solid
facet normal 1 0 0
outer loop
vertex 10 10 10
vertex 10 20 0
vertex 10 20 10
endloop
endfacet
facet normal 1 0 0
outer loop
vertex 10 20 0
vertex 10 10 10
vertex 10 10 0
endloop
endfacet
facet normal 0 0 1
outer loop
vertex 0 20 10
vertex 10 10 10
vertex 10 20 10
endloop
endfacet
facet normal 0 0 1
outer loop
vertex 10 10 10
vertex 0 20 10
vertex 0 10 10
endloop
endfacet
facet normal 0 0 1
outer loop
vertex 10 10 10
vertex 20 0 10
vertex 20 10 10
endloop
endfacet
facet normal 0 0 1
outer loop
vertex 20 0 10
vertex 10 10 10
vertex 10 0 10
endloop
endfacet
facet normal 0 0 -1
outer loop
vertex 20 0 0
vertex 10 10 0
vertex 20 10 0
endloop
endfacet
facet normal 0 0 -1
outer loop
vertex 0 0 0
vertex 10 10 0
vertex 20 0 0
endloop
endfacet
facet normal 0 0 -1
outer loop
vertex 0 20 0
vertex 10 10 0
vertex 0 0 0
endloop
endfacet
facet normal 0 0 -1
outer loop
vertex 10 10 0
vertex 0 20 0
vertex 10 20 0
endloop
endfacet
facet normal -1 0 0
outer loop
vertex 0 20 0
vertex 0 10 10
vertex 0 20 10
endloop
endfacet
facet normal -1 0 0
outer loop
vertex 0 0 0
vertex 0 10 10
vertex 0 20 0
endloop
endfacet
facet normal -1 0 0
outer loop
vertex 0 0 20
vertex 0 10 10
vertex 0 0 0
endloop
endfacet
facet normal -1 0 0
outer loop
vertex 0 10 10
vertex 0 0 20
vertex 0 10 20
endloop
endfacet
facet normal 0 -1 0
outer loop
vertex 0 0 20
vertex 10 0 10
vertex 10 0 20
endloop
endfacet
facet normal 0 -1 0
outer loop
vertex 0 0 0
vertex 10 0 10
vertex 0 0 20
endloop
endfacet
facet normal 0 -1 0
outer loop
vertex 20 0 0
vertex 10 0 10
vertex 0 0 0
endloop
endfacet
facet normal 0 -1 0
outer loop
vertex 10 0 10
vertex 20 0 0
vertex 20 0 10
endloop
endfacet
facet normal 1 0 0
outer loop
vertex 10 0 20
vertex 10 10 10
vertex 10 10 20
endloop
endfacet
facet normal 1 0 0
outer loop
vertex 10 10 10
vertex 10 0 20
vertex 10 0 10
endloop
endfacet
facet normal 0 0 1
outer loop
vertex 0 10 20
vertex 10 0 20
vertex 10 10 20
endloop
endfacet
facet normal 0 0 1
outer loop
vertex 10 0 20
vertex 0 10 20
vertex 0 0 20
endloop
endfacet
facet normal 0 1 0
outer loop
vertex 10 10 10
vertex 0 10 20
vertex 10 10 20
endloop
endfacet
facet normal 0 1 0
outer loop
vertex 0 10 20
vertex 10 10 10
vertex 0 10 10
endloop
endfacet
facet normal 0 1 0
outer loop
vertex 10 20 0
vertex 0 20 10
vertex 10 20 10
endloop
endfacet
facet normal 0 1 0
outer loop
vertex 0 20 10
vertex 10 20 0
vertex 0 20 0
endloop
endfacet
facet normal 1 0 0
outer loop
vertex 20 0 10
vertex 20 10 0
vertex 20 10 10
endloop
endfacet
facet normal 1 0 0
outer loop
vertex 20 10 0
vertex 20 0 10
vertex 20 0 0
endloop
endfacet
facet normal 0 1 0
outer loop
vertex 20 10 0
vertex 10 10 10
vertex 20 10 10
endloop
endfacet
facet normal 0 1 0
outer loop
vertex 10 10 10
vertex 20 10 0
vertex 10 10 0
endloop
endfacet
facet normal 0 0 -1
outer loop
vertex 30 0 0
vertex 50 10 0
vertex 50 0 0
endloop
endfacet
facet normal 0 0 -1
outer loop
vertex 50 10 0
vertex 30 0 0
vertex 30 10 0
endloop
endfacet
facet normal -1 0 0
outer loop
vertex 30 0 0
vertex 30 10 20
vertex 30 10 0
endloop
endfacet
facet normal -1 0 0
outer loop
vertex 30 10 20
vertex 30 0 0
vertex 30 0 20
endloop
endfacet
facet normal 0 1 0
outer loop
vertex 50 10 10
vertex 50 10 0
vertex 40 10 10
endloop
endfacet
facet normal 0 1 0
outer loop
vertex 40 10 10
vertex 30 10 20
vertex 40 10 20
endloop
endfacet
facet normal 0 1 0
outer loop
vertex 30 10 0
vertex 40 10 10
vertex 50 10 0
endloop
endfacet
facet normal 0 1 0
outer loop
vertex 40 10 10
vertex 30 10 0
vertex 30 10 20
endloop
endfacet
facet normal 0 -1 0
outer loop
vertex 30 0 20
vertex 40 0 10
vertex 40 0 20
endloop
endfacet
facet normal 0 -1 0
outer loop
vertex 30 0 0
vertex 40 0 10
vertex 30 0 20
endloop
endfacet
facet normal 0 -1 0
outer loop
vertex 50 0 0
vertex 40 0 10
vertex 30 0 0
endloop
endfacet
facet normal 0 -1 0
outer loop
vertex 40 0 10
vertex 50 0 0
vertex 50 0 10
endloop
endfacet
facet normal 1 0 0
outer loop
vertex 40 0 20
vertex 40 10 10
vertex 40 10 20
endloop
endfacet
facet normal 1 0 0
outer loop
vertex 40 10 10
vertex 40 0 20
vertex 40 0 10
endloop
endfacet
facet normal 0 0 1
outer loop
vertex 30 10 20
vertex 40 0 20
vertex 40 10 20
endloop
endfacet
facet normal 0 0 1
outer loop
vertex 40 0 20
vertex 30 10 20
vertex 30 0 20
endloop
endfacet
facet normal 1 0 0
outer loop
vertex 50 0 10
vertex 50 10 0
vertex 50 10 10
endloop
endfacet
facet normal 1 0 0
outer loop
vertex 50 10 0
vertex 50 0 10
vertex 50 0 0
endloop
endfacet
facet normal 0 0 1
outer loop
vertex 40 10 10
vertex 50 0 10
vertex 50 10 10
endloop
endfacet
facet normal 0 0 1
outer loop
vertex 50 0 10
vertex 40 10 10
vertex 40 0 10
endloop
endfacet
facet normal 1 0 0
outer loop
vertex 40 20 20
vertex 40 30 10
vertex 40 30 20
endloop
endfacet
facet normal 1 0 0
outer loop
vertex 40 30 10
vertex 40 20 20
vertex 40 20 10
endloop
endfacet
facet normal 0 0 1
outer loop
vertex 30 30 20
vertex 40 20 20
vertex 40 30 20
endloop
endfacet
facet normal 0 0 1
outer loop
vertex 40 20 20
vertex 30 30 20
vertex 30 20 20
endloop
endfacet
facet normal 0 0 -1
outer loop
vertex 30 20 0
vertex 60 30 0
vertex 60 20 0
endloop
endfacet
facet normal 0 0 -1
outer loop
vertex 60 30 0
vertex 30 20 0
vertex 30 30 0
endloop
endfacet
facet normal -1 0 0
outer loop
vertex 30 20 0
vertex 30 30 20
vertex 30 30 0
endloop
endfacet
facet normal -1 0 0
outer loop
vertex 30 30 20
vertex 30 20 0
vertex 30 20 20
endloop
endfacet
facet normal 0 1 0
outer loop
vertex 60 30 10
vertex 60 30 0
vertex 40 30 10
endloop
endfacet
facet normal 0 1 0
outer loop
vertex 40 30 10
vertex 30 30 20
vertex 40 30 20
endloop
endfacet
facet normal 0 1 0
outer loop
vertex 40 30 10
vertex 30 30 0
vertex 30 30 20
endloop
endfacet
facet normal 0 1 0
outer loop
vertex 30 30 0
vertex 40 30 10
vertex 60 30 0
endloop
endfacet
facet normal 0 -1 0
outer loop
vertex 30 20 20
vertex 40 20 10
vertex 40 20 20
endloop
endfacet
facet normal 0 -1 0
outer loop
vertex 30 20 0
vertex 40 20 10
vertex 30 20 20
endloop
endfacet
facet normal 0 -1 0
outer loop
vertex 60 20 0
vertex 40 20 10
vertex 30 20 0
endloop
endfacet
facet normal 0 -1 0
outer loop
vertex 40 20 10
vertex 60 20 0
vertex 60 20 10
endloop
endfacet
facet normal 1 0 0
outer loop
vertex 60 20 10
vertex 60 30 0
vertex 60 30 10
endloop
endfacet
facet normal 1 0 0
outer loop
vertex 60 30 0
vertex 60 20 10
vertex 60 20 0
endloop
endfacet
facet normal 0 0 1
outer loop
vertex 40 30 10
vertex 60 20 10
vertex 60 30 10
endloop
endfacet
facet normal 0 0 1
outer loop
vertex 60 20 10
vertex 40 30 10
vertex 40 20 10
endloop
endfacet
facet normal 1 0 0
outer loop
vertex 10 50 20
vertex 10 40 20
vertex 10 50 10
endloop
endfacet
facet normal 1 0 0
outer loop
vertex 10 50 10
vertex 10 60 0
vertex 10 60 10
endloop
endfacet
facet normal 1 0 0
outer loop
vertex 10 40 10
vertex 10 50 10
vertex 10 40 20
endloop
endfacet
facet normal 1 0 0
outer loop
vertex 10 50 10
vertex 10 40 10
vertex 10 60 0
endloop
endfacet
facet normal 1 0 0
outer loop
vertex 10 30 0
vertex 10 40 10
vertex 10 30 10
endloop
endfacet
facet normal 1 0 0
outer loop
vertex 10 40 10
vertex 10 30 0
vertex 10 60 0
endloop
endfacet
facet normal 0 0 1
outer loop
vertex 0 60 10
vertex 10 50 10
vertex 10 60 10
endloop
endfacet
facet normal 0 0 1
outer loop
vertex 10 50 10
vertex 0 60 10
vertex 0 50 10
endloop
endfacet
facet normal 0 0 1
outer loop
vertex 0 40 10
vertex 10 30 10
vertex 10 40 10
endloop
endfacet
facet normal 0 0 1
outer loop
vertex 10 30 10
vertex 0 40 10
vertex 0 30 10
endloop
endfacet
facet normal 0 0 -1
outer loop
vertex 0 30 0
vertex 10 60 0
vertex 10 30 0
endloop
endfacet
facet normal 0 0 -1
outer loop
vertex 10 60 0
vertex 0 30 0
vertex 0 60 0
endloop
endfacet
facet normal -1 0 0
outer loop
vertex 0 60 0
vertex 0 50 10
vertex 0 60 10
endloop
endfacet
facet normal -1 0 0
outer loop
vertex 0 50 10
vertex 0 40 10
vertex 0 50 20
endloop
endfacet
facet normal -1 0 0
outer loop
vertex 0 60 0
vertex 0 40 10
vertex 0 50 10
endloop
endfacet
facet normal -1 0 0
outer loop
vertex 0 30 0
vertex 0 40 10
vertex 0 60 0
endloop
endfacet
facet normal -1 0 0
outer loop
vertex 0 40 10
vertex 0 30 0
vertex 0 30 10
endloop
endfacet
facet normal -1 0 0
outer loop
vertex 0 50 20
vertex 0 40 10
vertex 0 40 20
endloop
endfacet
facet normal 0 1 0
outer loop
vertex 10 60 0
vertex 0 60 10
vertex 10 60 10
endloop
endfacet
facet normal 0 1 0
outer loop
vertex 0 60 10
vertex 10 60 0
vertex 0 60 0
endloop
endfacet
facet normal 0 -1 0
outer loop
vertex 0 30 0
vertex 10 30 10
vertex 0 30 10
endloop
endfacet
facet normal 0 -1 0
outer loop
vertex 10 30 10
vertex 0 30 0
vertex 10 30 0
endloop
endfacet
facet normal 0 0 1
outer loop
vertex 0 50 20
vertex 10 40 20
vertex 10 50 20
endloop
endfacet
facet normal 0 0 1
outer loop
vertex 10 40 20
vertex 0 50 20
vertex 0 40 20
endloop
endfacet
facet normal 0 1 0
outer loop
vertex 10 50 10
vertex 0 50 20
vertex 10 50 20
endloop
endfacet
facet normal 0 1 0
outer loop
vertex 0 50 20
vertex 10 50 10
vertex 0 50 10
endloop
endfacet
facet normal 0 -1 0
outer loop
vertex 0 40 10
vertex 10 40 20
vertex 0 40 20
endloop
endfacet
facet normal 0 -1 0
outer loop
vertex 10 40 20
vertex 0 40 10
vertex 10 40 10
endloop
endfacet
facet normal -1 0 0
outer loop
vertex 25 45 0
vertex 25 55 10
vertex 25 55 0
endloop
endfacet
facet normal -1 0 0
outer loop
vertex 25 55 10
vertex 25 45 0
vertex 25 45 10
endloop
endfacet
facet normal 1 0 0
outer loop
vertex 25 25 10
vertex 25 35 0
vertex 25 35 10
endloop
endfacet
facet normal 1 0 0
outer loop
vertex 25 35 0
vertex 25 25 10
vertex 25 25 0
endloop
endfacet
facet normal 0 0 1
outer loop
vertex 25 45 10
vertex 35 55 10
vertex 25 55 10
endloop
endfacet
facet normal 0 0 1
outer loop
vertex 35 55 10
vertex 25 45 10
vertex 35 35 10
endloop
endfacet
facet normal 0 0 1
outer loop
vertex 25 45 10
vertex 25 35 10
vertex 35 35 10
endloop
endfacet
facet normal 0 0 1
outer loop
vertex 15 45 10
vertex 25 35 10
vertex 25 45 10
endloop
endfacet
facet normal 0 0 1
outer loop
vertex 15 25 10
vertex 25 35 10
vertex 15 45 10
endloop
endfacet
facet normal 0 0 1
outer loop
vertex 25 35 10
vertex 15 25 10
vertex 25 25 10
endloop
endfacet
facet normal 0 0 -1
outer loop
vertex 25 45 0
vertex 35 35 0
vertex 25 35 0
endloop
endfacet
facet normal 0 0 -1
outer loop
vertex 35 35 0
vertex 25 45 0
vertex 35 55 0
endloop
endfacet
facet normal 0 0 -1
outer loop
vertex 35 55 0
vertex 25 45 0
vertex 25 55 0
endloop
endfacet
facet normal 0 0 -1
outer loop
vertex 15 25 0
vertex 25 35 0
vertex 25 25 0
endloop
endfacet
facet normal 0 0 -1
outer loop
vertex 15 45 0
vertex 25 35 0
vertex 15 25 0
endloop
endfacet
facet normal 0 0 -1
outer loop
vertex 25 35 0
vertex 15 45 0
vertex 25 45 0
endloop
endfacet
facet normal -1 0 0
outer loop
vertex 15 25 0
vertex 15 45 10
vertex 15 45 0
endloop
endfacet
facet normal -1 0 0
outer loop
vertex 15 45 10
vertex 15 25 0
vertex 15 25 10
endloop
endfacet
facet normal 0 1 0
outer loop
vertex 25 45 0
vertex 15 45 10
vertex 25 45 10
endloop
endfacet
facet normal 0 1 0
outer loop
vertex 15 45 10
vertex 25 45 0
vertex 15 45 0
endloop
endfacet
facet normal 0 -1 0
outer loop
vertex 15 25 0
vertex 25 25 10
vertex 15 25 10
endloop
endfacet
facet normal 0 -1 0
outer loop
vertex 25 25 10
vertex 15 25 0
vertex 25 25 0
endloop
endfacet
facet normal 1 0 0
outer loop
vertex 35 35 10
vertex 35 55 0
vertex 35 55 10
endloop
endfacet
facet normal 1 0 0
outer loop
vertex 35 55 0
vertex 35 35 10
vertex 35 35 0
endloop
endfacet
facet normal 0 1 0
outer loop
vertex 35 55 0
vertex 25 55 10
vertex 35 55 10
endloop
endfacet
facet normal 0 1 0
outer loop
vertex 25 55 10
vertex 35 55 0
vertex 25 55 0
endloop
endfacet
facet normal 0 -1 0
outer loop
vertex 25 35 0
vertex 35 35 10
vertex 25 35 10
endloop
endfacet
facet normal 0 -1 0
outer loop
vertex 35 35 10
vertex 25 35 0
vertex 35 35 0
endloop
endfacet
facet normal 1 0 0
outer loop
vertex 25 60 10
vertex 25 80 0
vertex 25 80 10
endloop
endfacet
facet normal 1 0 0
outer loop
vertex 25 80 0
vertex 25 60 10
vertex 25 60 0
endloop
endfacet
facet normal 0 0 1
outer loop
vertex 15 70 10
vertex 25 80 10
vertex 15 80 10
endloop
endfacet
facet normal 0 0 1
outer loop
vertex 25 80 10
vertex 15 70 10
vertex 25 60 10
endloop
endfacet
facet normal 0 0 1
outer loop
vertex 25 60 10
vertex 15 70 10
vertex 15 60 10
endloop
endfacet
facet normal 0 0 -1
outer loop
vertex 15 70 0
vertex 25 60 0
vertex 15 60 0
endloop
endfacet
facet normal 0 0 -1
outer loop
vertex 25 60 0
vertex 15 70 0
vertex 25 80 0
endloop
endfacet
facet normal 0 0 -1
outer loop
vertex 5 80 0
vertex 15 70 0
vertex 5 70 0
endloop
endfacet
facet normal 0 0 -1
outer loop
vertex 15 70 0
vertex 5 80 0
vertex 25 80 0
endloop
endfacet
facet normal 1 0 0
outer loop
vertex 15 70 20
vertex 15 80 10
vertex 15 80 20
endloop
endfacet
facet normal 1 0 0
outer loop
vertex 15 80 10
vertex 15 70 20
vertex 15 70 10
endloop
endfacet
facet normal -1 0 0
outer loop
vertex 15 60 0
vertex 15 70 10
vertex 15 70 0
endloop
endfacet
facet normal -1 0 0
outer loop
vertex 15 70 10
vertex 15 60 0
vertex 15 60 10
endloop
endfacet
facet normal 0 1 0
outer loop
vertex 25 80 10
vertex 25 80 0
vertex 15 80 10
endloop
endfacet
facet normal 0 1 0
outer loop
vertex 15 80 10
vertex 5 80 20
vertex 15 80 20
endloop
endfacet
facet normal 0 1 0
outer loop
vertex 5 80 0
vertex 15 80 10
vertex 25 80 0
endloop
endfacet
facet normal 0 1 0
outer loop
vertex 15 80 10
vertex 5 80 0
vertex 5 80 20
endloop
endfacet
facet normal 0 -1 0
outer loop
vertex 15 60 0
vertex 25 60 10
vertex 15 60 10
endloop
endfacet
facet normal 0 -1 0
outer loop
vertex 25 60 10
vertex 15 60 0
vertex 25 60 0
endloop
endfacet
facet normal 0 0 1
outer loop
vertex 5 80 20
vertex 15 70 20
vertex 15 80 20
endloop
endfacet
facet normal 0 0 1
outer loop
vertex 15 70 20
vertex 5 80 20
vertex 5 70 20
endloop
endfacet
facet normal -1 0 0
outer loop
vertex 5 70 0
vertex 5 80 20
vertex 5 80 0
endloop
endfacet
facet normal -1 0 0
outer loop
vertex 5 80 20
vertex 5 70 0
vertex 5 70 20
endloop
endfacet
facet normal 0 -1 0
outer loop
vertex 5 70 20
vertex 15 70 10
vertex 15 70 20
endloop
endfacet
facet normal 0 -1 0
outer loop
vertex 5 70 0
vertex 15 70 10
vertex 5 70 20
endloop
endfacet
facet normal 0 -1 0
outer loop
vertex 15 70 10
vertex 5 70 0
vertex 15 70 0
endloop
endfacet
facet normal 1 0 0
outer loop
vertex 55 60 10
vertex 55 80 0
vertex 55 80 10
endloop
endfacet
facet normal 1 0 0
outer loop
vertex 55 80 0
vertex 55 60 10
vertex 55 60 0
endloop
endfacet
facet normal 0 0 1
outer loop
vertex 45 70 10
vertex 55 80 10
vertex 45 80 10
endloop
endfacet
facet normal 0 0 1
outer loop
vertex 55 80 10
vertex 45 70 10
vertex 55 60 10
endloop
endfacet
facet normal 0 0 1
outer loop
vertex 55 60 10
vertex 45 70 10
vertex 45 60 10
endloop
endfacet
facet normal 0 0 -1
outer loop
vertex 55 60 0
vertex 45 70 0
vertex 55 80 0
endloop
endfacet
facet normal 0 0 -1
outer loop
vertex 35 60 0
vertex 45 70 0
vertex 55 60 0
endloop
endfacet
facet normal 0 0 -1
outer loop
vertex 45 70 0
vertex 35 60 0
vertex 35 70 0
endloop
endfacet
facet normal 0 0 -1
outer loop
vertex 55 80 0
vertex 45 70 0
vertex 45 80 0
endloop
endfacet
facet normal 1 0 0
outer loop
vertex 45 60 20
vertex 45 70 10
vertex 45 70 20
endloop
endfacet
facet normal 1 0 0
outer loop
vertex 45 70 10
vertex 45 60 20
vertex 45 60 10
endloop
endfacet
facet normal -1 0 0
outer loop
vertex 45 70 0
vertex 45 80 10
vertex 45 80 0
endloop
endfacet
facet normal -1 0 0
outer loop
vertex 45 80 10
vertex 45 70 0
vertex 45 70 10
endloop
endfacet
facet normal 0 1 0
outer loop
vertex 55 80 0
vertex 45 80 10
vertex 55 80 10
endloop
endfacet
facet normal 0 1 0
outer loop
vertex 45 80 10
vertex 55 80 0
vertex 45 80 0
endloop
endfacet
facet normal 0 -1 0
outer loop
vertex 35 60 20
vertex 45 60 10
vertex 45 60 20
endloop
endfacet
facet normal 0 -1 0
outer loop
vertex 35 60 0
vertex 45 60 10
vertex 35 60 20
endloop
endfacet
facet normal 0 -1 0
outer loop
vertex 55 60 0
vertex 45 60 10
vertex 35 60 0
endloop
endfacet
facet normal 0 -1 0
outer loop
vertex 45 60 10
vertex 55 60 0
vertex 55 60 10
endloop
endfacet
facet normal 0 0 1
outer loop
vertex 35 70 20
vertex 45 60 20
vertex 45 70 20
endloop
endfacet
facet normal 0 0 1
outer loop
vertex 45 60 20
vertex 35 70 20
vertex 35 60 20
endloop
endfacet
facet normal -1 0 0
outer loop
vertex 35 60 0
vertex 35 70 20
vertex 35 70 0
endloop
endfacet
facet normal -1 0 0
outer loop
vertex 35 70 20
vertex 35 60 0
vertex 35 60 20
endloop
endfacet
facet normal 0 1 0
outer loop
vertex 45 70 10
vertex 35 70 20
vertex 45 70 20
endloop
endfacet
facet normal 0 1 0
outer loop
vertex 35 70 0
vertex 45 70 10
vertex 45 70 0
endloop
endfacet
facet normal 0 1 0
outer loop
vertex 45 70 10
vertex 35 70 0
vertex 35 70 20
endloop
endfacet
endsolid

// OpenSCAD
cube(10);
translate([0,0,10]){
cube(10);
    }
translate([0,10,0]){
cube(10);
    }
translate([10,0,0]){
cube(10);
    }   
translate([30,0,0]){
cube(10);
    }
translate([30,0,0]){
cube([10,10,20]);
    }
translate([40,0,0]){
cube([10,10,10]);
    }
    
translate([30,20,0]){
cube([10,10,20]);
    }    
translate([40,20,0]){
cube([20,10,10]);
    }
translate([0,30,0]){
cube([10,30,10]);
    }    
translate([0,40,10]){
cube([10,10,10]);
    }
translate([15,25,0]){
cube([10,20,10]);
    }    
translate([25,35,0]){
cube([10,20,10]);
    }
    translate([15,60,0]){
cube([10,20,10]);
    }    
translate([5,70,0]){
cube([10,10,20]);
    }
    translate([45,60,0]){
cube([10,20,10]);
    }    
translate([35,60,0]){
cube([10,10,20]);
    }
